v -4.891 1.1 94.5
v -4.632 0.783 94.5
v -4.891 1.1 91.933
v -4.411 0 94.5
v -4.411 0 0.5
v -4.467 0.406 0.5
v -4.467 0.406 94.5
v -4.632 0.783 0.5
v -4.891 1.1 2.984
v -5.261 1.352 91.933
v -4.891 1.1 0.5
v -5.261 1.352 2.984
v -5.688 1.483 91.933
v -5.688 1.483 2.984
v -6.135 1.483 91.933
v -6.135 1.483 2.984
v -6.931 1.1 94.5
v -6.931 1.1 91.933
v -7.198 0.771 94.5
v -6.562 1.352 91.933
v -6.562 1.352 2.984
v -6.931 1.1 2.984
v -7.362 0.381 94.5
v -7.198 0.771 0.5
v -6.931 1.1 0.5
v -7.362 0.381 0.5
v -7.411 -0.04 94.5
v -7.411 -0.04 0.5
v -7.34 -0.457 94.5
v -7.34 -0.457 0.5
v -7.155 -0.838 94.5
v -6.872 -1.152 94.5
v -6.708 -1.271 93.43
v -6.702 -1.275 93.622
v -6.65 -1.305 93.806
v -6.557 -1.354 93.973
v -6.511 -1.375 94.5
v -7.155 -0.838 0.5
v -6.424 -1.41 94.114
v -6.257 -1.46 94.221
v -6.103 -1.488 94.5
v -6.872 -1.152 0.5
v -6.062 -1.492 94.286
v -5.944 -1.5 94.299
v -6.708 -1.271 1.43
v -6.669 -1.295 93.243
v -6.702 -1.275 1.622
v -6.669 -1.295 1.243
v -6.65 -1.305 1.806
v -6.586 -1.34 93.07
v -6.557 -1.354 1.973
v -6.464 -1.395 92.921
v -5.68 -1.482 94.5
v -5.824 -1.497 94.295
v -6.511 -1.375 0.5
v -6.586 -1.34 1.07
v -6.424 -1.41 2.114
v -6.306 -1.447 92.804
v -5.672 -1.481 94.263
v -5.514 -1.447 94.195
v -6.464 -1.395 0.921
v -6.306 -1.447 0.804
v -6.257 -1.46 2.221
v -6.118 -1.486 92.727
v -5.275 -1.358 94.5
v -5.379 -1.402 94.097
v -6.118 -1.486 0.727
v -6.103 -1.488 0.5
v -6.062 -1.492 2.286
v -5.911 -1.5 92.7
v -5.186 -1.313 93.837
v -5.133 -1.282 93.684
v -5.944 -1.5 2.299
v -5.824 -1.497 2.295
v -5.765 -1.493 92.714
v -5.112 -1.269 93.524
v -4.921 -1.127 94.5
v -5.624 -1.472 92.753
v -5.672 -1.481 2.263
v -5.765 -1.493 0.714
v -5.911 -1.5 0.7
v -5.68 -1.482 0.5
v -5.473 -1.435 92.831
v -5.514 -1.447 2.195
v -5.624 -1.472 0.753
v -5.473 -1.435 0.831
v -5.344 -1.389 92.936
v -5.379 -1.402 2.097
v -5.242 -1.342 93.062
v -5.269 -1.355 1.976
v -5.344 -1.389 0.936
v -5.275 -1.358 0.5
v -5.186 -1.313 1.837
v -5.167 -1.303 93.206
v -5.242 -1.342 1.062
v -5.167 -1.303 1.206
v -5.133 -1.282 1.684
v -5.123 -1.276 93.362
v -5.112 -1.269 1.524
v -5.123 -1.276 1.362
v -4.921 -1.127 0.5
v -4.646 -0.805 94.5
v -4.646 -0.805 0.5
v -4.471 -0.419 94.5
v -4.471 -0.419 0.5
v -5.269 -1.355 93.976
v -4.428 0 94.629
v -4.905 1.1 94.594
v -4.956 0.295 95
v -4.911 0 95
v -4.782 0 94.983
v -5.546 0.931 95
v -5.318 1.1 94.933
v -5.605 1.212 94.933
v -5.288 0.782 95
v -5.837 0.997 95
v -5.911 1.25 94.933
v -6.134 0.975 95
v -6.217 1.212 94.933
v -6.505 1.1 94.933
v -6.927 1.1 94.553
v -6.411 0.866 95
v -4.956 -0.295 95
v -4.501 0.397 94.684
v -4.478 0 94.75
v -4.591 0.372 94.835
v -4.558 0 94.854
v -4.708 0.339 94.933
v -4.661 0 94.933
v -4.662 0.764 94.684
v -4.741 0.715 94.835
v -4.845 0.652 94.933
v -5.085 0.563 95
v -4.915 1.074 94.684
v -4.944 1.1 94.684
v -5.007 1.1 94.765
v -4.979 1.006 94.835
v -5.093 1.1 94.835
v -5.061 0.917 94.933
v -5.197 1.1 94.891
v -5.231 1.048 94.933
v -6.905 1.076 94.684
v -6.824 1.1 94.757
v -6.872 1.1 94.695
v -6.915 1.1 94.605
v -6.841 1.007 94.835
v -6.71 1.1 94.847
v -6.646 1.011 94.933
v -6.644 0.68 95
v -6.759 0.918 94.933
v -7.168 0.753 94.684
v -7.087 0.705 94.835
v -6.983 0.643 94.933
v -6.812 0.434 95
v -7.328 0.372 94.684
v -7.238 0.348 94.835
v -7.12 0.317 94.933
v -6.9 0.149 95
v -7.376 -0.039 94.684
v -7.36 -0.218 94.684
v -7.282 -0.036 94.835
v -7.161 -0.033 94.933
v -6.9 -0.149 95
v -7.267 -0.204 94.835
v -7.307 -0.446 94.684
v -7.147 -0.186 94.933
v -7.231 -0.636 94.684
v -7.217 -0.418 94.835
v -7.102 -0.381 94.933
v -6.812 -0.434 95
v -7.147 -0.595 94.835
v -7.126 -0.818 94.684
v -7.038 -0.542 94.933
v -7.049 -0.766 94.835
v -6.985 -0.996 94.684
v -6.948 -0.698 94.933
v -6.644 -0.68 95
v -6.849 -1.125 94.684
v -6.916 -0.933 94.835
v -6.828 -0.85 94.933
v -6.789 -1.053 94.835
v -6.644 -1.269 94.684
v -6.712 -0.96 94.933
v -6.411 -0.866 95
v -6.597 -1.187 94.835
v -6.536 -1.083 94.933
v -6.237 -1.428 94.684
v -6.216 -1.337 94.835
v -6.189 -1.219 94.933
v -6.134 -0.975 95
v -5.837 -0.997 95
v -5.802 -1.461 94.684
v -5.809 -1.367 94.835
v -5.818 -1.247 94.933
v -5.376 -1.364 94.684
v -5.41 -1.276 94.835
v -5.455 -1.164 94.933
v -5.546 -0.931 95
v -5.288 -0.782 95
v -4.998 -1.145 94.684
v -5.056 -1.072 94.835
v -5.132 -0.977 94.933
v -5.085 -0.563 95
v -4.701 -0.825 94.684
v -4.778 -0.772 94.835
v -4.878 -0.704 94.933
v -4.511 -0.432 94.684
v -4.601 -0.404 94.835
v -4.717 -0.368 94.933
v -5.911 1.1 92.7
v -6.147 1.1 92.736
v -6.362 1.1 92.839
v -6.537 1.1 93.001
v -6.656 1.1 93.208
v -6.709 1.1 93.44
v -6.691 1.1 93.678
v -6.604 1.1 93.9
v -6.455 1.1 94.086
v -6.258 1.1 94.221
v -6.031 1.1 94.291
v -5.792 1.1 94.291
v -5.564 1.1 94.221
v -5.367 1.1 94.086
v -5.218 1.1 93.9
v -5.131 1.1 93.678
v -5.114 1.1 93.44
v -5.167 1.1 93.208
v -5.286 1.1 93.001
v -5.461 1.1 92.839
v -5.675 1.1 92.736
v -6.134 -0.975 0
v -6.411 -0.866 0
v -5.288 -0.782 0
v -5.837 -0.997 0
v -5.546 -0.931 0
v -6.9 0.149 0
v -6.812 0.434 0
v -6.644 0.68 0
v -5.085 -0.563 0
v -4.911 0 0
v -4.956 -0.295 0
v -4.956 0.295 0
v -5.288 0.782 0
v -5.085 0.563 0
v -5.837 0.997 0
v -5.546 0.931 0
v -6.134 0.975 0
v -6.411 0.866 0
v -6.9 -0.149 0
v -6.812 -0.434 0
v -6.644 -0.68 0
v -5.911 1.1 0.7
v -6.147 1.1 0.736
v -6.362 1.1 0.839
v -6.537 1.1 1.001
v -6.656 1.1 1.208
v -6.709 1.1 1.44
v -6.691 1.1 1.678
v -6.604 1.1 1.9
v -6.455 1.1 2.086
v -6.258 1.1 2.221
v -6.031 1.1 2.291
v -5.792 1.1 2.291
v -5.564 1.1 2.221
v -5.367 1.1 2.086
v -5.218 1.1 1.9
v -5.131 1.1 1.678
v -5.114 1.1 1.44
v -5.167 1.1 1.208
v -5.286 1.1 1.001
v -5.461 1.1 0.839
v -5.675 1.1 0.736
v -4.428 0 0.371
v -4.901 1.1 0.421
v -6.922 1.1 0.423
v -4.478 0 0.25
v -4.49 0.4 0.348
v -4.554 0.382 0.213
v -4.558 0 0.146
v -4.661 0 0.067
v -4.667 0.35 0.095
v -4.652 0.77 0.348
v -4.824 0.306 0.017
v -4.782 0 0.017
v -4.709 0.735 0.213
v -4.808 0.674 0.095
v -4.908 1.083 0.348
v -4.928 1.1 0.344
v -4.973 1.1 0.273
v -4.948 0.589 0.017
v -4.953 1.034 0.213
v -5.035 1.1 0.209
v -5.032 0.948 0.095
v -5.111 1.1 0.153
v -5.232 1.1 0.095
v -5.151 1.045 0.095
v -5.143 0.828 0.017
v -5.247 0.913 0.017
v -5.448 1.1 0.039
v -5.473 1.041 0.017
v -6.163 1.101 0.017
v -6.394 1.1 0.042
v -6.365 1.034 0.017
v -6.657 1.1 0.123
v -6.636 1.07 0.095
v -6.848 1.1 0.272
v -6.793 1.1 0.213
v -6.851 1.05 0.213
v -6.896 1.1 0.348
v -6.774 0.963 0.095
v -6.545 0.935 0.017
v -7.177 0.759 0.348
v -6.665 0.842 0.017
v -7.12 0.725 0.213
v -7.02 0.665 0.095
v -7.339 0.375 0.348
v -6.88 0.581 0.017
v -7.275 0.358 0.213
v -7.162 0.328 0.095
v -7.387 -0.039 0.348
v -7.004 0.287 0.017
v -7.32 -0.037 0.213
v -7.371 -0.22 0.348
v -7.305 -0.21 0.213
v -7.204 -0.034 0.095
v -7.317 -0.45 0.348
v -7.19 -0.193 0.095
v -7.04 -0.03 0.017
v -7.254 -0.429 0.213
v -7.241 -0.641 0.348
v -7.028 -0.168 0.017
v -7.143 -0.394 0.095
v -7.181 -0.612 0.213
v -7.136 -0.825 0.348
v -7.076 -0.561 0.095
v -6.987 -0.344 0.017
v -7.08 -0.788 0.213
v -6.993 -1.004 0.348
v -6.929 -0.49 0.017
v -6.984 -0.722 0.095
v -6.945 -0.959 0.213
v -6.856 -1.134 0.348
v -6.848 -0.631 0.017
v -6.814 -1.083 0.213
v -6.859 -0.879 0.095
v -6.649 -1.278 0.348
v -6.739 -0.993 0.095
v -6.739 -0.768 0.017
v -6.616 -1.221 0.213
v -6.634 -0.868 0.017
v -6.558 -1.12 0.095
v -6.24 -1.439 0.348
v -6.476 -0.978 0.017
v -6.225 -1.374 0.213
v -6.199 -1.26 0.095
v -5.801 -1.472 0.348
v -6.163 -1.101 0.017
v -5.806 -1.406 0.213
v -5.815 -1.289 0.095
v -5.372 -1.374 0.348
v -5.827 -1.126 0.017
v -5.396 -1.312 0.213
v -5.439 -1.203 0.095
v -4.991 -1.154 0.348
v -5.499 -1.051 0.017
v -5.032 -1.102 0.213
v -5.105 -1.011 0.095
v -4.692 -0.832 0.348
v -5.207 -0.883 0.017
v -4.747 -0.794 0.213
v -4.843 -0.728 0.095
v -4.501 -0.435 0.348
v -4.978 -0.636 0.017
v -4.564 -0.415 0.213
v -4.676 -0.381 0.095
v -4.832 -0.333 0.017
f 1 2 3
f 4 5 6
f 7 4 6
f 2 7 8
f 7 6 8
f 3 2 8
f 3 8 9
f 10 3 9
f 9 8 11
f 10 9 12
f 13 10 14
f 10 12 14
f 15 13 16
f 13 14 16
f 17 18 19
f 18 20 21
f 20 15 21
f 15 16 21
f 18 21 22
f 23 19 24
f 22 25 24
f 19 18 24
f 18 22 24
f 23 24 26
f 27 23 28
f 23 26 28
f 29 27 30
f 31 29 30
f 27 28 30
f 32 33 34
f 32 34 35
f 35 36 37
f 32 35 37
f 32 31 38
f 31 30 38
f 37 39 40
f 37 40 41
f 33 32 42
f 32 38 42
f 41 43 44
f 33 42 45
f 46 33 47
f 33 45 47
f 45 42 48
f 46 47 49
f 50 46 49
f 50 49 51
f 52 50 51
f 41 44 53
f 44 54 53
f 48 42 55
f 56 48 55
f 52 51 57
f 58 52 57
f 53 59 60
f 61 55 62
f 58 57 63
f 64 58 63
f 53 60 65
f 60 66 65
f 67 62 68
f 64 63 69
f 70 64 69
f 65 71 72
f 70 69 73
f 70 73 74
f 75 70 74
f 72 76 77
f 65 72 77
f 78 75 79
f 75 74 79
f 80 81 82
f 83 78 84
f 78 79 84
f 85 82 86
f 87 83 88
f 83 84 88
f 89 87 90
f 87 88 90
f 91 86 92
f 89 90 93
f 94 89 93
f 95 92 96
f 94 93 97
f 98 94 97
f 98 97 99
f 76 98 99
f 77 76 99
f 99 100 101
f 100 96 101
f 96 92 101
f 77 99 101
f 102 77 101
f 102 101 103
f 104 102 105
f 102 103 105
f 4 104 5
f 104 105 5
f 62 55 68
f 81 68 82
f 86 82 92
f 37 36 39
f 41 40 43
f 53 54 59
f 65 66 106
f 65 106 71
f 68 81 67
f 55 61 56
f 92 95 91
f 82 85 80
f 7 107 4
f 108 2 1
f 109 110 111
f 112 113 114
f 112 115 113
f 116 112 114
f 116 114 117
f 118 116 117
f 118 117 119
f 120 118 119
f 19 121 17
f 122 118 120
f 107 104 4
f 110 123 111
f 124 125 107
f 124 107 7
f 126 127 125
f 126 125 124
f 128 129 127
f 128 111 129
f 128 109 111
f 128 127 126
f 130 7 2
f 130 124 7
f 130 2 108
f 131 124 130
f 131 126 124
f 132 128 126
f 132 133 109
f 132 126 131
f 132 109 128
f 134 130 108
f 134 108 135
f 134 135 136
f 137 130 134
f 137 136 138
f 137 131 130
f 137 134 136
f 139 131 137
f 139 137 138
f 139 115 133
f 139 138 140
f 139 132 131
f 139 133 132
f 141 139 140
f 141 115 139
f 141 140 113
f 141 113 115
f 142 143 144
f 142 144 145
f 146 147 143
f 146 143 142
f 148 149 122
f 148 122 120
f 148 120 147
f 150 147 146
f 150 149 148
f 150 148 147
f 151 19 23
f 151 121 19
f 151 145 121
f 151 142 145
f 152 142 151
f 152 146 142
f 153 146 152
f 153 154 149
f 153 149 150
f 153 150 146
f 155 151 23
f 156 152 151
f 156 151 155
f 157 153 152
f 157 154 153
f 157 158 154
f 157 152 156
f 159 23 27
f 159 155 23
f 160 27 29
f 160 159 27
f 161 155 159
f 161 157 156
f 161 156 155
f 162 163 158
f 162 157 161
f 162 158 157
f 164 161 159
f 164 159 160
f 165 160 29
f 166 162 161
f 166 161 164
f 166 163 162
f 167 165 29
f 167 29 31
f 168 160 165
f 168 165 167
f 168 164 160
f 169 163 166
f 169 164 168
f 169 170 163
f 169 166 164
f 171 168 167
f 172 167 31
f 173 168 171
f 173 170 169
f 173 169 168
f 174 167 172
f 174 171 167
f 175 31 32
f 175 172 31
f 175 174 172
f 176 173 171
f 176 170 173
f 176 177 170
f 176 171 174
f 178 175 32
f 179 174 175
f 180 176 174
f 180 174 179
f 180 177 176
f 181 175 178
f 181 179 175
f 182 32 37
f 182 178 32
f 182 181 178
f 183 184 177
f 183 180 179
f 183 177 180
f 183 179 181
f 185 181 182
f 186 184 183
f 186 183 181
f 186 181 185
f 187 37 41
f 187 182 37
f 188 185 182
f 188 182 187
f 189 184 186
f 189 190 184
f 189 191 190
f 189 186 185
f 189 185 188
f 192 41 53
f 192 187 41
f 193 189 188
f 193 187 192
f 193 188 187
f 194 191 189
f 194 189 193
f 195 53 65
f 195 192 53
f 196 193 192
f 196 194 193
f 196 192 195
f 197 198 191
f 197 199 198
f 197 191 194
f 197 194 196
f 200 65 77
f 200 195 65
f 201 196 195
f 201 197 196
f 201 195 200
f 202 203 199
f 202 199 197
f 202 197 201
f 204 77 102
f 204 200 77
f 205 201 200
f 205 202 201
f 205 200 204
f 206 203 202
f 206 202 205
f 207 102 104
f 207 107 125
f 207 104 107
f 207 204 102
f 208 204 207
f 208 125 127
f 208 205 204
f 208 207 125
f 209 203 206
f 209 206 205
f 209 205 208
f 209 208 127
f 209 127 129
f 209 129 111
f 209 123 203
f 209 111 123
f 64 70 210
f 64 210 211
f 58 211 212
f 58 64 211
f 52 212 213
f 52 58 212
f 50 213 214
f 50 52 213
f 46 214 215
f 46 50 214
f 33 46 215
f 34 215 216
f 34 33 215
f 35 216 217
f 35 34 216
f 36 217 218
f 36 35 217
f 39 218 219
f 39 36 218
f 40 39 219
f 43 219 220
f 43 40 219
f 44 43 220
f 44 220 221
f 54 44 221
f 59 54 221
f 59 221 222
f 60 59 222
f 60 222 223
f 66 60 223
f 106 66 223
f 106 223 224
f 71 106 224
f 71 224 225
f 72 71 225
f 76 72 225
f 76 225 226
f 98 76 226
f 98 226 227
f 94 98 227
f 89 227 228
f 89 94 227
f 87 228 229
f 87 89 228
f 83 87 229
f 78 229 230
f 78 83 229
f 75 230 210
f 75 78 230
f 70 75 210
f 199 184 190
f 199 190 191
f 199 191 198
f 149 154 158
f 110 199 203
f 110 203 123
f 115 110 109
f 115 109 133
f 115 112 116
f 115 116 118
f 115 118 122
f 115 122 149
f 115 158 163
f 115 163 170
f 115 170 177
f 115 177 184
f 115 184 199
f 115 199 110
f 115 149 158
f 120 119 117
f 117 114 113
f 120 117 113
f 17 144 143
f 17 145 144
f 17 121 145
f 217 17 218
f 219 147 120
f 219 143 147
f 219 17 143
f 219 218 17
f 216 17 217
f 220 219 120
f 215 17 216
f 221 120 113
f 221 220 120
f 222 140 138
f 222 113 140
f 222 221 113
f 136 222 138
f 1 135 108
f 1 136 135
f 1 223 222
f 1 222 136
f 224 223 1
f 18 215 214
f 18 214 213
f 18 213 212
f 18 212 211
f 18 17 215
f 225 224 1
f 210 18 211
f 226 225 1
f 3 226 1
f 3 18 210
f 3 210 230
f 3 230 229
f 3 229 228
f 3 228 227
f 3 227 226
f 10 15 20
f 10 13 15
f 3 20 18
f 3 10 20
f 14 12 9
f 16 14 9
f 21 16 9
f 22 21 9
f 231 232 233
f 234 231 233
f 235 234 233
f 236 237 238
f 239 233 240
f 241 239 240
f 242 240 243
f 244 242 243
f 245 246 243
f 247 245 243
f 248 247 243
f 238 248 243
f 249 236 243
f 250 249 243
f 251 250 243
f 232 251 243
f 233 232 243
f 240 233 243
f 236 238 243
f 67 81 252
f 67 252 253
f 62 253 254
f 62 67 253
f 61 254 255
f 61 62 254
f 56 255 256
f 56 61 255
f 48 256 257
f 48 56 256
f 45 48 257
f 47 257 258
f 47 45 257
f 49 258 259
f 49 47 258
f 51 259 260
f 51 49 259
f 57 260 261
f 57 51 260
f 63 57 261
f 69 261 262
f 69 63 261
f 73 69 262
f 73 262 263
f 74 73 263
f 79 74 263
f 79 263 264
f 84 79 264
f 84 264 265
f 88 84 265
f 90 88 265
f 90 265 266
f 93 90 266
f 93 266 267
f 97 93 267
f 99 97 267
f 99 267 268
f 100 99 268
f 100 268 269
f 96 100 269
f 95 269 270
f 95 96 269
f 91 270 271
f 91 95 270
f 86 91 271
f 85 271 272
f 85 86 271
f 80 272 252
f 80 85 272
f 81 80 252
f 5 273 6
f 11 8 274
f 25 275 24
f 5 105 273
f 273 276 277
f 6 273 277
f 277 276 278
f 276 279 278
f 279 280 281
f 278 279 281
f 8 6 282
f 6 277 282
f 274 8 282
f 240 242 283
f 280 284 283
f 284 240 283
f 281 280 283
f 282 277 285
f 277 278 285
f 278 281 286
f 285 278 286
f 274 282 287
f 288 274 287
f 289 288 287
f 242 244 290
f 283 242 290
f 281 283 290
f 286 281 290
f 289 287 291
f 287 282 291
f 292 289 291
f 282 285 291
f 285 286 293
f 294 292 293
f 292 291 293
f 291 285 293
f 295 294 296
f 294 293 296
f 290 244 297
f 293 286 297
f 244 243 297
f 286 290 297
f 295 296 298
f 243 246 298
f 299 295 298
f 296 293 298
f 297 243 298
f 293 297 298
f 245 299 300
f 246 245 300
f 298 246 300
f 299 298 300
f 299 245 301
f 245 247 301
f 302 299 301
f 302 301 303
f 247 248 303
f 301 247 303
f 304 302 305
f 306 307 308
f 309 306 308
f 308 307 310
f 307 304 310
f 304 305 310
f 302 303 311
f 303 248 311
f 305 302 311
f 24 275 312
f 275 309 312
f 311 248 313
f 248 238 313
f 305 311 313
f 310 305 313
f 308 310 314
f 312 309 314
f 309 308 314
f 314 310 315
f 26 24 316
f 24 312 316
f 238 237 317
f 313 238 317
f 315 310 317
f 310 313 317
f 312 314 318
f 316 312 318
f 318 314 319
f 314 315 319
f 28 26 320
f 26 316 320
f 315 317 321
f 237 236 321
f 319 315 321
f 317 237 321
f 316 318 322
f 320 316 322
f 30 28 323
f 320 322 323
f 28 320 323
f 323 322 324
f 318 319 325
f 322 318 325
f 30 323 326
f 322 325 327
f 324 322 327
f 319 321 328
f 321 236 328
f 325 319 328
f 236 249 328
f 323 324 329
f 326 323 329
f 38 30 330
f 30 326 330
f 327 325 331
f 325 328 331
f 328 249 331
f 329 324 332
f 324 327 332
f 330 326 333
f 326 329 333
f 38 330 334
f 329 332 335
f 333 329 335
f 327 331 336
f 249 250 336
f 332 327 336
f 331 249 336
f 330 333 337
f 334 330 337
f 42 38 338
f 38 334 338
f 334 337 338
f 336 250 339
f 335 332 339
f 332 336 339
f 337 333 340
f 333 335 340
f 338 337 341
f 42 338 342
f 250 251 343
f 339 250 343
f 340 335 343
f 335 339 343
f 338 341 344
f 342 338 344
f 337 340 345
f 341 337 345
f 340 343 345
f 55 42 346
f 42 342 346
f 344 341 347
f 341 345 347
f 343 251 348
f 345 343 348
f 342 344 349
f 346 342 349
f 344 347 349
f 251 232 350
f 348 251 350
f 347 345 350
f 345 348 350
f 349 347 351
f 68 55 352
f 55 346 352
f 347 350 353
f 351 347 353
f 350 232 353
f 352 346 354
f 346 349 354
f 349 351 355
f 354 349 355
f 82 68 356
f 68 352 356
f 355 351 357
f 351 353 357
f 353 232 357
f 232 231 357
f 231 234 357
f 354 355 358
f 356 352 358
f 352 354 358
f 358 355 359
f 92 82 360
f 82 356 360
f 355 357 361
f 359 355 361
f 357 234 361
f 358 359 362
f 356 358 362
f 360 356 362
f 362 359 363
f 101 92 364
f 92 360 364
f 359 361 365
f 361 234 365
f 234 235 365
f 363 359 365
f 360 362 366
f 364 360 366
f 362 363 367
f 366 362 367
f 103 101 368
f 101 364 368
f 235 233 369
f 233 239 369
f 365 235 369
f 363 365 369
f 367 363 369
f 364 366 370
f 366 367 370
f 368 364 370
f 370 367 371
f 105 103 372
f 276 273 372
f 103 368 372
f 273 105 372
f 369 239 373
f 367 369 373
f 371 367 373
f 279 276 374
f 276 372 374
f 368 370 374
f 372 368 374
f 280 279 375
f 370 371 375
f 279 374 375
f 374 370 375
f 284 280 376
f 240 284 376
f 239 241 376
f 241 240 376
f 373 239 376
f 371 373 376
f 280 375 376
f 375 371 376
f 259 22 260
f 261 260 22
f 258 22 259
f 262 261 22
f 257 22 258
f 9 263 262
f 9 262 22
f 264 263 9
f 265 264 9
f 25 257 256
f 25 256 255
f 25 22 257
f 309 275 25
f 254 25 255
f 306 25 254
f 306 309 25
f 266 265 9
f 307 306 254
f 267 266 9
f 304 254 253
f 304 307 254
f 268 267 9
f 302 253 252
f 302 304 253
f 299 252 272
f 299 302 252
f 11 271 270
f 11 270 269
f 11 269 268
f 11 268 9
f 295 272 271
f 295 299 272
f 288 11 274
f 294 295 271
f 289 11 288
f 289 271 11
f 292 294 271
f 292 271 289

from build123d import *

# Parameters (mm, degrees)
SKETCH1_R               = 1.5
BOSS_EXTRUDE1_DEPTH     = 95
CUT_EXTRUDE1_DEPTH      = 50
CUT_EXTRUDE1_DEPTH_BACK = 50
SKETCH3_R               = 0.8
FILLET1_R               = 0.5
SKETCH4_W               = 2.5
SKETCH4_H               = 3
CUT_EXTRUDE3_DEPTH      = 0.4


with BuildPart() as part:
    # Sketch1 → Boss-Extrude1 (new body)
    with BuildSketch(Plane.XY):
        with Locations((-5.911296371, 0)):
            Circle(SKETCH1_R)
    extrude(amount=BOSS_EXTRUDE1_DEPTH)

    # Sketch3 → Cut-Extrude1 (cut, two sides: drawn at the far end of the back side and taken through both)
    with BuildSketch(Plane(origin=(0, 0, 0), x_dir=(1, 0, 0), z_dir=(0, 1, 0)).offset(-CUT_EXTRUDE1_DEPTH_BACK)):
        with Locations((-5.911296371, -1.5)):
            Circle(SKETCH3_R)
        with Locations((-5.911296371, -93.5)):
            Circle(SKETCH3_R)
    extrude(amount=CUT_EXTRUDE1_DEPTH + CUT_EXTRUDE1_DEPTH_BACK, mode=Mode.SUBTRACT)

    # Fillet1
    fillet1_edges = [part.edges().sort_by_distance(p)[0] for p in [
        (-7.411296371, 0, 0),
        (-7.411296371, 0, 95),
    ]]
    fillet(fillet1_edges, radius=FILLET1_R)

    # Sketch4 → Cut-Extrude3 (cut)
    with BuildSketch(Plane(origin=(0, 1.5, 0), x_dir=(1, 0, 0), z_dir=(0, 1, 0))):
        with Locations((-5.911296371, -93.433012702)):
            Rectangle(SKETCH4_W, SKETCH4_H)
        with Locations((-5.911296371, -1.484191421)):
            Rectangle(SKETCH4_W, SKETCH4_H)
    extrude(amount=-CUT_EXTRUDE3_DEPTH, mode=Mode.SUBTRACT)


solid = part.part
